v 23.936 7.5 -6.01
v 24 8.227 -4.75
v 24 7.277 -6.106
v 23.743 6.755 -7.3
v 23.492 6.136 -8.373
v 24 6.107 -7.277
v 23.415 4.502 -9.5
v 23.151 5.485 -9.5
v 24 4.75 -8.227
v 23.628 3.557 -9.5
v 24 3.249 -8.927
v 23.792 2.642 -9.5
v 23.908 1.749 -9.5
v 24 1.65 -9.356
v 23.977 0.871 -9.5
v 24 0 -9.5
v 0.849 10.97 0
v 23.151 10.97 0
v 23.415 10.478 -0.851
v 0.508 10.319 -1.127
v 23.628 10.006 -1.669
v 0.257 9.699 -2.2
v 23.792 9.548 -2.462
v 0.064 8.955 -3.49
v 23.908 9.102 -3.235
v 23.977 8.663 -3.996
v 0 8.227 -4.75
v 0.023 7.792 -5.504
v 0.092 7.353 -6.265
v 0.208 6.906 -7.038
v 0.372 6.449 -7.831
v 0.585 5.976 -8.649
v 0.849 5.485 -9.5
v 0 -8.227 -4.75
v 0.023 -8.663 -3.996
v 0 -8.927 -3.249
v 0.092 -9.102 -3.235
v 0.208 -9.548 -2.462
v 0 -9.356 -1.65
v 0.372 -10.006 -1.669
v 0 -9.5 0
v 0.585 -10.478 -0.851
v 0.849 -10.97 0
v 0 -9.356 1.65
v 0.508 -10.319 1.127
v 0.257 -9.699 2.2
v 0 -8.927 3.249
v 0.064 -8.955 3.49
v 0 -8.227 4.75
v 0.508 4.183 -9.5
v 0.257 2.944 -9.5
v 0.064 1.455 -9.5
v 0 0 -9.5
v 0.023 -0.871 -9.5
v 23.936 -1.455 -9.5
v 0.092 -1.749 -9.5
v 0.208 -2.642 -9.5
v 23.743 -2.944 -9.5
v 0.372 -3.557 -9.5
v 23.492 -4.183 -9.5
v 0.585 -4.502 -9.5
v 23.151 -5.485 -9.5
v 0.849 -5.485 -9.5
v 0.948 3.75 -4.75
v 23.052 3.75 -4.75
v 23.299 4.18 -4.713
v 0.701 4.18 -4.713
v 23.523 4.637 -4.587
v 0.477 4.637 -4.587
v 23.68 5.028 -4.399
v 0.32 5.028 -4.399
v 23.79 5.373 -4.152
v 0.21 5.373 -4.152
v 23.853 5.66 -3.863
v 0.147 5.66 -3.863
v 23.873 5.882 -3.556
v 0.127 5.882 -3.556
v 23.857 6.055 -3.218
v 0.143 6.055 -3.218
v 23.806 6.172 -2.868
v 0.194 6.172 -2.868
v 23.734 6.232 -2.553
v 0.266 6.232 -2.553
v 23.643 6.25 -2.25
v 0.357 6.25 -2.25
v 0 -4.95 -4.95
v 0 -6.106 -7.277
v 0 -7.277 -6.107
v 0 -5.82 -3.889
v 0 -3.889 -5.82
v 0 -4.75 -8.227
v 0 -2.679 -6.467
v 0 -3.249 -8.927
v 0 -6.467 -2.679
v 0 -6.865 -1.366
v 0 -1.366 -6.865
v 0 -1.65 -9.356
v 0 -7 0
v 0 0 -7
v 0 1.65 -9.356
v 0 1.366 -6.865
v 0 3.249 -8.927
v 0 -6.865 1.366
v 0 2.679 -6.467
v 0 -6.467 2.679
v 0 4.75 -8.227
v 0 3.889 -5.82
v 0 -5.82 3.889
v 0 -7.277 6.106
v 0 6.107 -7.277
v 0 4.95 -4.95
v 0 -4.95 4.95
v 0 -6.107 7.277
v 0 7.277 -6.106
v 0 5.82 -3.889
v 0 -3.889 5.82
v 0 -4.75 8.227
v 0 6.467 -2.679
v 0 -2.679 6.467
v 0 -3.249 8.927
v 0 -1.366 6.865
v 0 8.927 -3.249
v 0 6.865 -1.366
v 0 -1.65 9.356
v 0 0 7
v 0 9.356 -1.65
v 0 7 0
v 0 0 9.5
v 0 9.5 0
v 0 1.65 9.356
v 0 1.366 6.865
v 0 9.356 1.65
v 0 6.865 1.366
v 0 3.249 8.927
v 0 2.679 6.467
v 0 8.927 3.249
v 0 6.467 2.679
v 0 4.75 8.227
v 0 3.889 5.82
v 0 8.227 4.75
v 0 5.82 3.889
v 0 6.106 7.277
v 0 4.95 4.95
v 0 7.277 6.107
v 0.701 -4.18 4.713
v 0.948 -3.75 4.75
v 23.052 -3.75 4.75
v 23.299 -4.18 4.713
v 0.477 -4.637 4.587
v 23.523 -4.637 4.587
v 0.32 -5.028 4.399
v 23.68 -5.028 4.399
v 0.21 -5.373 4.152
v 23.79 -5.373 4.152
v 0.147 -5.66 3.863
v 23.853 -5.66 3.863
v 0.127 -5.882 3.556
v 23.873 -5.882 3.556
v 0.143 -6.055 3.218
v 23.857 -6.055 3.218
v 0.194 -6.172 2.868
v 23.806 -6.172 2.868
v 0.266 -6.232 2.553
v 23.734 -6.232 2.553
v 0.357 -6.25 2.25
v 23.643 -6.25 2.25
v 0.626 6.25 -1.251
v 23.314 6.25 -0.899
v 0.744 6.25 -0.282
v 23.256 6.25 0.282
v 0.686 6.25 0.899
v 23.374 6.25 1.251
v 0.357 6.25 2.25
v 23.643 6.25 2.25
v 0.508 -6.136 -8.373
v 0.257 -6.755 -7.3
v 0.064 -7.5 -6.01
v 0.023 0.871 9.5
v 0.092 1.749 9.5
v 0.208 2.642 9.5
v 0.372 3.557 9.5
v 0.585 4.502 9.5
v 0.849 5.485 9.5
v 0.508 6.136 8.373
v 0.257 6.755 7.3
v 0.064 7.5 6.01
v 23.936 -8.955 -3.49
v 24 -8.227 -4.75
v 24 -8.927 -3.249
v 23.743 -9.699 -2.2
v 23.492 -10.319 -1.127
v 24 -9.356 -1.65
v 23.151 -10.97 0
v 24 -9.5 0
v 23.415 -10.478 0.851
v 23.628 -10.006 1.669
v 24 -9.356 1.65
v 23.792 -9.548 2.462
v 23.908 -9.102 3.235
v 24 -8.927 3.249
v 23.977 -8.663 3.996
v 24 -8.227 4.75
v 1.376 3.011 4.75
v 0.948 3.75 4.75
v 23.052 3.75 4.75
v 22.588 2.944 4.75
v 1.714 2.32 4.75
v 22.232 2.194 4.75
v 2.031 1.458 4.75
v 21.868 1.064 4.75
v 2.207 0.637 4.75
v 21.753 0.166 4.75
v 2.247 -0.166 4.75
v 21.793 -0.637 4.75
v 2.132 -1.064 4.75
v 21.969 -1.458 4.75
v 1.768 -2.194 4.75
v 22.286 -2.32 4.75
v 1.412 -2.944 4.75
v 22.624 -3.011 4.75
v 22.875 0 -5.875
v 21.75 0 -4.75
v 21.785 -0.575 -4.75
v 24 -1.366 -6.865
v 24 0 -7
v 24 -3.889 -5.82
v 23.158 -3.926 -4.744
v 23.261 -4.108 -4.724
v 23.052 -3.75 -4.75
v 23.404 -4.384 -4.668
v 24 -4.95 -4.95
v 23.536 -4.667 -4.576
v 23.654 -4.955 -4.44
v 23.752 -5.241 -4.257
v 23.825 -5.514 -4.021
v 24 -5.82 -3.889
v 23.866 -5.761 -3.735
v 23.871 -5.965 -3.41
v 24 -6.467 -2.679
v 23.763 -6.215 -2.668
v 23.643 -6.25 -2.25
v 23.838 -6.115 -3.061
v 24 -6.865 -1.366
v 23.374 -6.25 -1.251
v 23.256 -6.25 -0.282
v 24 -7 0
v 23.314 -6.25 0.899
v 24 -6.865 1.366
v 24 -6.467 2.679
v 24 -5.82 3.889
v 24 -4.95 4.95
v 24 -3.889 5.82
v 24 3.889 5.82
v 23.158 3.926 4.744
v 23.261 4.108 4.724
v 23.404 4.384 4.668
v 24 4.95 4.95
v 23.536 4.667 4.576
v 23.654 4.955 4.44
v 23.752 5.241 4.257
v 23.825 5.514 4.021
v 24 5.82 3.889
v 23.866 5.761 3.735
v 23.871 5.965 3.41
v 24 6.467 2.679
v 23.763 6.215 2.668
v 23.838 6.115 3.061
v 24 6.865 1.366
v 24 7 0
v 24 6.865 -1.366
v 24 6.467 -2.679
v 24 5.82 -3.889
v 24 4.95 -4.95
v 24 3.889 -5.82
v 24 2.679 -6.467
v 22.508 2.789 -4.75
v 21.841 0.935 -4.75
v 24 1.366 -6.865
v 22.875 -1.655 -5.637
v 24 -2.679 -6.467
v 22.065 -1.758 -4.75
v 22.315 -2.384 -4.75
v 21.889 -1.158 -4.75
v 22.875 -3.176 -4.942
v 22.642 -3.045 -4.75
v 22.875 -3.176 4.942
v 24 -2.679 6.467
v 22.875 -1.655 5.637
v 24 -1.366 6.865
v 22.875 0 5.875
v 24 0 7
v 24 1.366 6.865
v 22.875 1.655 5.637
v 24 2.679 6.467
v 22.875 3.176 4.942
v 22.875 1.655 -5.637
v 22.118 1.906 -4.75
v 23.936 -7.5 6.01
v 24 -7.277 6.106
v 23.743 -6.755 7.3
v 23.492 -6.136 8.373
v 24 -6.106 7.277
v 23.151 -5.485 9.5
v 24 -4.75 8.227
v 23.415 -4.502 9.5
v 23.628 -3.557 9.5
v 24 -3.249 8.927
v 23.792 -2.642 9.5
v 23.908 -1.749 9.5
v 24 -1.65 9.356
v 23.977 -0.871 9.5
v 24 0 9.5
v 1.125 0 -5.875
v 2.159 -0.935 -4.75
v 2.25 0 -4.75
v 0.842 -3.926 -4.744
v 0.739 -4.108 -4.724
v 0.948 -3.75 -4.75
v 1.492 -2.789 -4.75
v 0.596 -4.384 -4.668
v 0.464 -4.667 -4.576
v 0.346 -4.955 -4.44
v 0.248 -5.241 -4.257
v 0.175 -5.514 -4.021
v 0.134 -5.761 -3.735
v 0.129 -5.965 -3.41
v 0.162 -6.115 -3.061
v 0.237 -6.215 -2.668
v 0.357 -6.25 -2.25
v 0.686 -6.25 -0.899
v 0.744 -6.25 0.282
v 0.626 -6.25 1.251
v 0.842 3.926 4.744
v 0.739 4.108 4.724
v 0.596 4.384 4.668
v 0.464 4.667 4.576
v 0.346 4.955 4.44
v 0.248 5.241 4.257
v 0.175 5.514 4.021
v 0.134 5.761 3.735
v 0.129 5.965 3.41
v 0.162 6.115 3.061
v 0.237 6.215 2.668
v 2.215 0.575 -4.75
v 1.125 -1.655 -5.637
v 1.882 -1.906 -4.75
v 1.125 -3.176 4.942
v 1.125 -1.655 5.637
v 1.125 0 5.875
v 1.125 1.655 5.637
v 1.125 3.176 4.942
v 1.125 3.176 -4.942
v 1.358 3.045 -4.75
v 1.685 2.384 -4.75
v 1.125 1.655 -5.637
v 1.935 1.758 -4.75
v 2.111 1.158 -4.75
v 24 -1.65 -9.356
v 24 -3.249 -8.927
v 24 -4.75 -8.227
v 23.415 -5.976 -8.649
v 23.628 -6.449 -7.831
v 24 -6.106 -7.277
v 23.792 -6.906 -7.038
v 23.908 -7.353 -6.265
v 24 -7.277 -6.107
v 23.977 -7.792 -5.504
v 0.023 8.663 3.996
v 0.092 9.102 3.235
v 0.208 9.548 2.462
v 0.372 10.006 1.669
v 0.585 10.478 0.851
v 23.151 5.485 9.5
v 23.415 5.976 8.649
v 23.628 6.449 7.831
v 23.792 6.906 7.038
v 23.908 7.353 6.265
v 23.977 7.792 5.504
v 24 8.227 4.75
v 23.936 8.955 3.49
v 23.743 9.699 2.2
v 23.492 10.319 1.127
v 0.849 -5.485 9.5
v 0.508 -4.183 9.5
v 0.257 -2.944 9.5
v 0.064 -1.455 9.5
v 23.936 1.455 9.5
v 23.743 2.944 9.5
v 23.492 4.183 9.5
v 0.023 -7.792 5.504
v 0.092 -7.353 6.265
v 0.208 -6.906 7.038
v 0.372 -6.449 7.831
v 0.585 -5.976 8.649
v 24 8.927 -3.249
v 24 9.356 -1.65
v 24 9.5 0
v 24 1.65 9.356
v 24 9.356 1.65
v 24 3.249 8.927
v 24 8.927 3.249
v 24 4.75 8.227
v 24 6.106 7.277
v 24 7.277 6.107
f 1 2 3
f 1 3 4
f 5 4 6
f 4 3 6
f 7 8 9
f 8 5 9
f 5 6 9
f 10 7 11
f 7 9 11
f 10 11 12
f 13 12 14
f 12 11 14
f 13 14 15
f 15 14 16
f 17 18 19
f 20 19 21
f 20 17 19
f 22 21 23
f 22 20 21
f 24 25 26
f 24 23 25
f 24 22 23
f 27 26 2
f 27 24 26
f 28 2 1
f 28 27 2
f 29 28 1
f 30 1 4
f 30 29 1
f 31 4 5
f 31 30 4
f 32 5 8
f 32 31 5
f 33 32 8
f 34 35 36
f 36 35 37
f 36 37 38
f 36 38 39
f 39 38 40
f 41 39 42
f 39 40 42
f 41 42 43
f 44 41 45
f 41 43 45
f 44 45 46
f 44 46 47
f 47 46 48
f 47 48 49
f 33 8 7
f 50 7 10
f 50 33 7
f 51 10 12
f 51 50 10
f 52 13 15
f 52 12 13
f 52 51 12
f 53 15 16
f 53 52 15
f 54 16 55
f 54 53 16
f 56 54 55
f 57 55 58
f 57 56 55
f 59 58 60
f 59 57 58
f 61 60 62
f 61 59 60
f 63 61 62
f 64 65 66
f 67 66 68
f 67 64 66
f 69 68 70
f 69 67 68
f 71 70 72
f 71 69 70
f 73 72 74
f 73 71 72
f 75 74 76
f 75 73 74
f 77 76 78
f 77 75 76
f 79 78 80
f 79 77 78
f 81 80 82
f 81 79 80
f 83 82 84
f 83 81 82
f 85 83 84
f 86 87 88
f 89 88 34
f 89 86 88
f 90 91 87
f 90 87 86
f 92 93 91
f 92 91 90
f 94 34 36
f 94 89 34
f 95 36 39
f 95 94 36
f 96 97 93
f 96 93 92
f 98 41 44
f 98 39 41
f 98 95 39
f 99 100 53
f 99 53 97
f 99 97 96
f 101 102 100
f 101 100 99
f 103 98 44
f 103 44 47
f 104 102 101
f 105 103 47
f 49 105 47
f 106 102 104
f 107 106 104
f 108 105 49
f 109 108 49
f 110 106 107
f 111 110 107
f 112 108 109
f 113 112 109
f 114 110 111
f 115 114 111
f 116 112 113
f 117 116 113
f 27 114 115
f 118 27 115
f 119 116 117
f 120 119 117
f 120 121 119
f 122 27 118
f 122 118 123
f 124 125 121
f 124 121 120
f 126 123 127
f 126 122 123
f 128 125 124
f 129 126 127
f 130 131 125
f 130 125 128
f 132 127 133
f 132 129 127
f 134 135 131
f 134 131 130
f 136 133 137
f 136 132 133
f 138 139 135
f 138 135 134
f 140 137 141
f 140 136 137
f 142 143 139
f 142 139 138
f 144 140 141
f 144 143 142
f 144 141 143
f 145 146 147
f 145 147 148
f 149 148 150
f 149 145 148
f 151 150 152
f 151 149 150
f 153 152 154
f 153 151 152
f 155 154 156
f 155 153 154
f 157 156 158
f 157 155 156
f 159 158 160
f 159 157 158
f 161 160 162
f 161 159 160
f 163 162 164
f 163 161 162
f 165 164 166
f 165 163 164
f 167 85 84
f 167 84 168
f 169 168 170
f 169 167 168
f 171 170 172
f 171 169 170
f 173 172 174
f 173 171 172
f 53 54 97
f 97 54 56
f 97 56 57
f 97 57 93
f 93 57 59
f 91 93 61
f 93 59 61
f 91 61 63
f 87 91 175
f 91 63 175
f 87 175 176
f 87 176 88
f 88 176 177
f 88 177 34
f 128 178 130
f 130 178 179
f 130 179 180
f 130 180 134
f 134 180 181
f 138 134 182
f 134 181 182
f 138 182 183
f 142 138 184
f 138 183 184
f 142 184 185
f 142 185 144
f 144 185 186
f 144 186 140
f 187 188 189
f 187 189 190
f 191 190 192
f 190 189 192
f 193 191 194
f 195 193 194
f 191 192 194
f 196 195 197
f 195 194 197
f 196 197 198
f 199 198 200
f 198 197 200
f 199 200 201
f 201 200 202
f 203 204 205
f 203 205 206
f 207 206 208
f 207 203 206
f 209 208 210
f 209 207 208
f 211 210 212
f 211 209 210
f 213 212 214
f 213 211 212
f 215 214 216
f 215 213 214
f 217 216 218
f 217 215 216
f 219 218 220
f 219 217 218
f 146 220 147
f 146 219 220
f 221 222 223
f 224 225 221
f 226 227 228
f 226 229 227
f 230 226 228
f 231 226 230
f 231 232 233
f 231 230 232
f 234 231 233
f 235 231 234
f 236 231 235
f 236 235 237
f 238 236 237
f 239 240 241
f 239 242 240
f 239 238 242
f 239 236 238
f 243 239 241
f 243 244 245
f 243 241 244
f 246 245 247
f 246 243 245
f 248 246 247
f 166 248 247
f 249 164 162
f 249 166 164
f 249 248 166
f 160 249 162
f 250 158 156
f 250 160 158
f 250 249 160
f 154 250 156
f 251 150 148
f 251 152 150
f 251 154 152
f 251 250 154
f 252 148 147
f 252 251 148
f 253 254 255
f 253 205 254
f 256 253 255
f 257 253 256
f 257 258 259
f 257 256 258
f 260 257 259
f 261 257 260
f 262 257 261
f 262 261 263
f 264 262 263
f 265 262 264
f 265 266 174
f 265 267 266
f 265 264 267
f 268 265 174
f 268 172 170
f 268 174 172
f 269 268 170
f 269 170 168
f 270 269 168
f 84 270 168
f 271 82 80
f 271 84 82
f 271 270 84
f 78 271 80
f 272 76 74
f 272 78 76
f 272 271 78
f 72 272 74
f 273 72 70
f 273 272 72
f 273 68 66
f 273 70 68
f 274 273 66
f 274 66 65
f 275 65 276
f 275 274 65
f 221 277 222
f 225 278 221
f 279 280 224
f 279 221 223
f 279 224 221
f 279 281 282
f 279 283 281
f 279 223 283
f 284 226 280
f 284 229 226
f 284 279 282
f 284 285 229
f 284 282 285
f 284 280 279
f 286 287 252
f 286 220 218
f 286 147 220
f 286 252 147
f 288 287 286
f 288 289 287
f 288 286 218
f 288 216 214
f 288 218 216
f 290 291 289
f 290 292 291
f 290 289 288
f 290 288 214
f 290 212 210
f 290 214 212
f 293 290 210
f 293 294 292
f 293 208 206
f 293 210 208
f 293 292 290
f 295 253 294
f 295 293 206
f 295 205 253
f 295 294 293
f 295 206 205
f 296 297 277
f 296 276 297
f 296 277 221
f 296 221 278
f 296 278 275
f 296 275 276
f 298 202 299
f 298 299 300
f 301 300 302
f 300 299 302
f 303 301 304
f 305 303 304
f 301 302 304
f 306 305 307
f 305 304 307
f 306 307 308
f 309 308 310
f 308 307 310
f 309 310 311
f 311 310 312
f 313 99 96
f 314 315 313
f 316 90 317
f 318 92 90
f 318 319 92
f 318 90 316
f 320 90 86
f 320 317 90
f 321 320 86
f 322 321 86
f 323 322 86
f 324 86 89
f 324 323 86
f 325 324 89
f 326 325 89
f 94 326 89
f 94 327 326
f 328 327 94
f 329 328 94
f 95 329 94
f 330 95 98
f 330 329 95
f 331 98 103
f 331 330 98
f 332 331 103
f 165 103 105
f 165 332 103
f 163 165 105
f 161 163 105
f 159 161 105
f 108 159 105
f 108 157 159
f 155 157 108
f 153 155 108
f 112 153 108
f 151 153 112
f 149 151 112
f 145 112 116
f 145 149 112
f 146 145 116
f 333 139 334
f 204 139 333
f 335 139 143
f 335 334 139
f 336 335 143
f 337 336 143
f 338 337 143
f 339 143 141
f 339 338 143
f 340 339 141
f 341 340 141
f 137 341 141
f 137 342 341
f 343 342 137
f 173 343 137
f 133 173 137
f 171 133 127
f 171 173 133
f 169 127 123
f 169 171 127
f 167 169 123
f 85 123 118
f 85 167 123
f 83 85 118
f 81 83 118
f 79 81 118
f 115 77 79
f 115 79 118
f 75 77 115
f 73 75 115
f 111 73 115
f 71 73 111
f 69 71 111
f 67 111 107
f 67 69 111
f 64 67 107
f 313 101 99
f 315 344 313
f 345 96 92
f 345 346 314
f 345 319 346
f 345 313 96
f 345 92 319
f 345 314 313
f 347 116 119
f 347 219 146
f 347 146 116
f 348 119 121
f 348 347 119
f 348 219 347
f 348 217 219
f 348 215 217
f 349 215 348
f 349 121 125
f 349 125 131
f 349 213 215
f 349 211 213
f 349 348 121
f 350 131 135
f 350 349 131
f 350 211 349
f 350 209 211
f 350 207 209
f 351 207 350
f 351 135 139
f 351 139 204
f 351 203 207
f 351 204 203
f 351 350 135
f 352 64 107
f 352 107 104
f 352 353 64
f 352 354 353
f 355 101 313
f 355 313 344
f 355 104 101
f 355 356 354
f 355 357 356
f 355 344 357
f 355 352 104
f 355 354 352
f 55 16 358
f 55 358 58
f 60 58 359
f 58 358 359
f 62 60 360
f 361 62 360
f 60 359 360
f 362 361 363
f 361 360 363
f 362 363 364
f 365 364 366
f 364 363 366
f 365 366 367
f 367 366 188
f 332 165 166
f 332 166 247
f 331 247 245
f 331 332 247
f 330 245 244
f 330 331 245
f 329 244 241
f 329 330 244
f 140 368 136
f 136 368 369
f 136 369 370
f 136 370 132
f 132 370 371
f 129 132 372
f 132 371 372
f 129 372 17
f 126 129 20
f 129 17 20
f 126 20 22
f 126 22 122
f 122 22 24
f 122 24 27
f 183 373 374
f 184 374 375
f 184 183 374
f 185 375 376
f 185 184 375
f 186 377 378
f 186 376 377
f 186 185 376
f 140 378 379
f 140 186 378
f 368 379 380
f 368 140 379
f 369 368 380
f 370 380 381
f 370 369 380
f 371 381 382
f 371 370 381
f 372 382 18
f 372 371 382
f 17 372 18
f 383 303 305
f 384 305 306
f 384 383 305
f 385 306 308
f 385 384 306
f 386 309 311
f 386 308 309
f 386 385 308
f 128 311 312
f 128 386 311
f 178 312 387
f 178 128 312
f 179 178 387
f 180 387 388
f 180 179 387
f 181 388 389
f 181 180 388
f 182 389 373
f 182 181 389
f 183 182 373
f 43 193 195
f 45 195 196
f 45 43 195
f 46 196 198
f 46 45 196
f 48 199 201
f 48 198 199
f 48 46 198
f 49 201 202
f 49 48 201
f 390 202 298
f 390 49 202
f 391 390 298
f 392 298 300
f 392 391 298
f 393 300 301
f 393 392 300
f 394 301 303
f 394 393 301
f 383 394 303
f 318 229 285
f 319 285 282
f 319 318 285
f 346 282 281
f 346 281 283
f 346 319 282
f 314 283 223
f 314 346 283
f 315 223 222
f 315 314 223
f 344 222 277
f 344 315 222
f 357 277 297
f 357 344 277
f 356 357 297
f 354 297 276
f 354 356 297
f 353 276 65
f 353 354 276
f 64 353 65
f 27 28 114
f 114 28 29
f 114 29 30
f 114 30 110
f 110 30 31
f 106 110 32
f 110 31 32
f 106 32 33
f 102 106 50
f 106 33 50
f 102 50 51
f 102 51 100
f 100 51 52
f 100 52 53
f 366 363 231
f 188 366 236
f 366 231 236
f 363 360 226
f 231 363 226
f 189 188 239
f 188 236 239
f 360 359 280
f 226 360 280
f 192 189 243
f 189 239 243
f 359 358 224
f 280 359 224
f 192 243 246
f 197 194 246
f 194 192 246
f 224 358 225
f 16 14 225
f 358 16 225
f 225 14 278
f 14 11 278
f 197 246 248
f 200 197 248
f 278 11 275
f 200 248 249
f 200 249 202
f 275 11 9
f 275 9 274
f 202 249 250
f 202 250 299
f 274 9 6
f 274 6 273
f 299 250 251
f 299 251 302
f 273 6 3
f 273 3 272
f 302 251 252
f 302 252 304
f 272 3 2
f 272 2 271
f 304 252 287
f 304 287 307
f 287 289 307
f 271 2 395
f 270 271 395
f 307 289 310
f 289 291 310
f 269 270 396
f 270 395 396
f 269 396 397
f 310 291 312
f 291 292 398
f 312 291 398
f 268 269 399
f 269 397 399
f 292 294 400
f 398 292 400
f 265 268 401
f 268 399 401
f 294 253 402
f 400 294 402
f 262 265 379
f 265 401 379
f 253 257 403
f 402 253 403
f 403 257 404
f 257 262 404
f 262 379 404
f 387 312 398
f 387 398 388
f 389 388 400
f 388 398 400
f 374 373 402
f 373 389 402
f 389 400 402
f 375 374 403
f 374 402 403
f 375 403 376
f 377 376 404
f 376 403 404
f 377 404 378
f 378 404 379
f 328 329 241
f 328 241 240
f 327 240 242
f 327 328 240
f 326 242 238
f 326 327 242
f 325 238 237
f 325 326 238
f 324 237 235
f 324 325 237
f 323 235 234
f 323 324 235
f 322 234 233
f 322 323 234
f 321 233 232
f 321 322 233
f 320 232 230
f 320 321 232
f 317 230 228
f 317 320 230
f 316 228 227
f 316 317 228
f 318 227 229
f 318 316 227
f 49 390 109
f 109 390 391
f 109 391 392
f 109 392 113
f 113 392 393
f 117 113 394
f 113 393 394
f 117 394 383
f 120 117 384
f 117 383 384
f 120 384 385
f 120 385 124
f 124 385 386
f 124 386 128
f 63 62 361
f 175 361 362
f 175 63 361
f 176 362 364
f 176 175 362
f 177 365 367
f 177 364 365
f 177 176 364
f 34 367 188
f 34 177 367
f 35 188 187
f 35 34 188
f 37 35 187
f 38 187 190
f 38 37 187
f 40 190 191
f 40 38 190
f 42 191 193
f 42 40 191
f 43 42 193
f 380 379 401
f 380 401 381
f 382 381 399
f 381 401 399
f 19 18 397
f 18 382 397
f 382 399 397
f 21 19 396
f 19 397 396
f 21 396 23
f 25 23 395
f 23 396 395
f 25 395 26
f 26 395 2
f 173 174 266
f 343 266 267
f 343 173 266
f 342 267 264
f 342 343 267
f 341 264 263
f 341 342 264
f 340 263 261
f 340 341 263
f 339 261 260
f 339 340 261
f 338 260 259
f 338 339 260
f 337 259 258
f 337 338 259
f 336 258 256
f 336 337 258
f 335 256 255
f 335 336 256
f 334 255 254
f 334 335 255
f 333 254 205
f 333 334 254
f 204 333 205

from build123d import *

# Parameters (mm, degrees)
BOSS_EXTRU_1_DEPTH = 24


with BuildPart() as part:
    # Esquisse1 → Boss.-Extru.1 (new body)
    with BuildSketch(Plane(origin=(0, 0, 0), x_dir=(0, 0, -1), z_dir=(1, 0, 0))):
        Polygon((-9.5, -5.484827557), (-9.5, 5.484827557), (0, 10.969655115), (9.5, 5.484827557), (9.5, -5.484827557), (0, -10.969655115), align=None)
        with BuildLine():
            Line((2.25, 6.25), (-2.25, 6.25))
            ThreePointArc((-2.25, 6.25), (-4.017766953, 5.517766953), (-4.75, 3.75))
            Line((-4.75, 3.75), (-4.75, -3.75))
            ThreePointArc((-4.75, -3.75), (-4.017766953, -5.517766953), (-2.25, -6.25))
            Line((-2.25, -6.25), (2.25, -6.25))
            ThreePointArc((2.25, -6.25), (4.017766953, -5.517766953), (4.75, -3.75))
            Line((4.75, -3.75), (4.75, 3.75))
            ThreePointArc((4.75, 3.75), (4.017766953, 5.517766953), (2.25, 6.25))
        make_face(mode=Mode.SUBTRACT)
    extrude(amount=BOSS_EXTRU_1_DEPTH)

    # Esquisse6 → Enlèvement de matière-Révolution1 (revolve, cut)
    with BuildSketch(Plane(origin=(0, 0, 0), x_dir=(1, 0, 0), z_dir=(0, 1, 0))):
        Polygon((-4.48433242, 1.732908411), (2.760156758, 14.280731742), (21.239843242, 14.280731742), (28.008759285, 2.556625243), (28.008759285, 15.540866197), (-4.48433242, 15.540866197), align=None)
    revolve(axis=Axis((24, 0, 0), (-1, 0, 0)), mode=Mode.SUBTRACT)

    # Esquisse11 → Enlèvement de matière-Révolution3 (revolve, cut)
    with BuildSketch(Plane(origin=(0, 0, 0), x_dir=(1, 0, 0), z_dir=(0, 1, 0)), mode=Mode.PRIVATE) as enl_vement_de_mati_re_r_volution3_sk:
        Polygon((0, 0), (0, -7), (3, -4), (21, -4), (24, -7), (24, 0), align=None)
    revolve(enl_vement_de_mati_re_r_volution3_sk.sketch.rotate(Axis((24, 0, 0), (-1, 0, 0)), 180), axis=Axis((24, 0, 0), (-1, 0, 0)), mode=Mode.SUBTRACT)  # turned: the seam where the file's is


solid = part.part
